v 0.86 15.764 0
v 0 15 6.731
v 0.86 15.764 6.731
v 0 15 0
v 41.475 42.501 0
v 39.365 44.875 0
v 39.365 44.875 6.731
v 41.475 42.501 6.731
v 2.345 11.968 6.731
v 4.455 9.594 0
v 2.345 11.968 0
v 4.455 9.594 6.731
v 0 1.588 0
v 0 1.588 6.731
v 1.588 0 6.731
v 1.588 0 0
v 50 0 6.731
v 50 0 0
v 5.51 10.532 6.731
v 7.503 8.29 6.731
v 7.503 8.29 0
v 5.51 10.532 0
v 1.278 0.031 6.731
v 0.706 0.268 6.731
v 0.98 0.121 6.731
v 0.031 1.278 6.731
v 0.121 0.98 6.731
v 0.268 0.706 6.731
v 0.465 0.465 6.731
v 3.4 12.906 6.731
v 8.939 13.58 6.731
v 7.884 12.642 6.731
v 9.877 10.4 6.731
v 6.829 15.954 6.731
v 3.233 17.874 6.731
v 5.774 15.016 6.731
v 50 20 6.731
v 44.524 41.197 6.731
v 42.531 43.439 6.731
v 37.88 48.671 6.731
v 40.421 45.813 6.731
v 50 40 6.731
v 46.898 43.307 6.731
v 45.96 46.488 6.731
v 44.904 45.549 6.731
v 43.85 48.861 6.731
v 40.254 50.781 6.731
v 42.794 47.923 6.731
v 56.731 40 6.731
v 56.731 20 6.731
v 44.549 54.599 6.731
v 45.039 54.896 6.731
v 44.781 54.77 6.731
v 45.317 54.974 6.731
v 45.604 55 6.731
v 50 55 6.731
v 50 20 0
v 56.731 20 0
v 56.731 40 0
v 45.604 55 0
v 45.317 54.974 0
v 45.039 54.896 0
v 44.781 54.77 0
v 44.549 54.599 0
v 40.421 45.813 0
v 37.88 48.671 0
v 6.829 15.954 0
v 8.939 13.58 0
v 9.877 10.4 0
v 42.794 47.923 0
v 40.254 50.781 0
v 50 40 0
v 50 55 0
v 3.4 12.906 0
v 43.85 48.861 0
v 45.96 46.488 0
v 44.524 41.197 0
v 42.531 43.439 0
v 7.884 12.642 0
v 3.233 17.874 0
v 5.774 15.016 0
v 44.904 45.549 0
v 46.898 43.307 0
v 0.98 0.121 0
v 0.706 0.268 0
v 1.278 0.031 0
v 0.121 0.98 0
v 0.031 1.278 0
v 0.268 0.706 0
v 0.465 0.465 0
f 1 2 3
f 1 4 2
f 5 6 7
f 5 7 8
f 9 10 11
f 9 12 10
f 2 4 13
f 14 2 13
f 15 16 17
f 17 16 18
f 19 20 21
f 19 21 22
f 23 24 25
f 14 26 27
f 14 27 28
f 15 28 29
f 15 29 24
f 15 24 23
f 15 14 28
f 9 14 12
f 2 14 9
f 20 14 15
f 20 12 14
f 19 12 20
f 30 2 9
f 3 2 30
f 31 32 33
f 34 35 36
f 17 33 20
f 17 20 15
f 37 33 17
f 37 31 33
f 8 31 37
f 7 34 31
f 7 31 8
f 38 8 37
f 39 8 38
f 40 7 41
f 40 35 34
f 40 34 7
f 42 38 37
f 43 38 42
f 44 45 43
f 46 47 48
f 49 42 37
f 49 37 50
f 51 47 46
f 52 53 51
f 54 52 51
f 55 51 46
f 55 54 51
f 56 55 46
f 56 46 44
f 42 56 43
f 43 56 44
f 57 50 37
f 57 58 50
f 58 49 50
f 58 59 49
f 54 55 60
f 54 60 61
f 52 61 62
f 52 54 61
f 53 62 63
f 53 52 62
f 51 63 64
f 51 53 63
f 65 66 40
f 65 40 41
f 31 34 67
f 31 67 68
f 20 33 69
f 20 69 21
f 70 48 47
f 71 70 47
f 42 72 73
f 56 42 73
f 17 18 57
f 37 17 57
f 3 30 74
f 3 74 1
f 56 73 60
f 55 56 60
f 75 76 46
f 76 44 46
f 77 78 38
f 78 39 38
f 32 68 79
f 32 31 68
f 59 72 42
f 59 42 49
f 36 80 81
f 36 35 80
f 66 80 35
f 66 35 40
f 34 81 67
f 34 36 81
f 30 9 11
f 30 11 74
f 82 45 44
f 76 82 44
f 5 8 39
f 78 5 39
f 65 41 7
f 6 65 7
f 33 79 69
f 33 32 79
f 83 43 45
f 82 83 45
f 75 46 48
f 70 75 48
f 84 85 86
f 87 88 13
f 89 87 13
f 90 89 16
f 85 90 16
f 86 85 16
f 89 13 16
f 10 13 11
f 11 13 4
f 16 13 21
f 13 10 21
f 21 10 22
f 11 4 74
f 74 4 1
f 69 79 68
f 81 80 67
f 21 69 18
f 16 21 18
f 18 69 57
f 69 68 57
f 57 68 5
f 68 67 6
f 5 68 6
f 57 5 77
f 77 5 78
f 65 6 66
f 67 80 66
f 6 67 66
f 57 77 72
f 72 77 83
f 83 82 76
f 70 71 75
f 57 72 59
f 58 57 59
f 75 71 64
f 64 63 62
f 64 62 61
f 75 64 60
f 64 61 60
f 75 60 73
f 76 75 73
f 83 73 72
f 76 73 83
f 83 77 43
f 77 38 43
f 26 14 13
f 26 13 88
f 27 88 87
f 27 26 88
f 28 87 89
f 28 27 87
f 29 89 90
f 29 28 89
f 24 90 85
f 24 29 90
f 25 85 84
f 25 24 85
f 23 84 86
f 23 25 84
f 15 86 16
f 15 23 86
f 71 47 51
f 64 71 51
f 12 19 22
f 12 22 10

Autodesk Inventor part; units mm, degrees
ref_plane "YZ Plane" through (0, 0, 0) normal (1, 0, 0) x (0, 1, 0)
ref_plane "XZ Plane" through (0, 0, 0) normal (0, 1, 0) x (-1, 0, 0)
ref_plane "XY Plane" through (0, 0, 0) normal (0, 0, 1) x (1, 0, 0)
sketch "Sketch1" plane through (0, 0, 0) normal (0, 0, 1) x (1, 0, 0)
  line L0 (0, 0) -> (50, 0)
  line L1 (50, 0) -> (50, 40)
  line L2 (50, 40) -> (56.731, 40)
  line L3 (56.731, 40) -> (56.731, 20)
  line L4 (56.731, 20) -> (50, 20)
  line L5 (50, 20) -> (50, 40)
  line L6 (10, 3.269) -> (30, 3.269)
  line L7 (30, 3.269) -> (30, 10)
  line L8 (30, 10) -> (10, 10)
  line L9 (10, 10) -> (10, 3.269)
  line L10 (0, 10) -> (10, 10)
  line L11 (30, 10) -> (50, 10)
  line L12 (0, 10) -> (0, 0)
  line L13 (0, 10) -> (0, 15)
  line L14 (0, 15) -> (45, 55)
  line L15 (50, 40) -> (50, 55)
  line L16 (50, 55) -> (45, 55)
  point P0 (20, 3.269)
  point P1 (20, 0)
  dimension "d2" = 20
  dimension "d3" = 20
  dimension "d5" = 6.731
  dimension "d6" = 10
  dimension "d9" = 10
  dimension "d11" = 20
  dimension "d12" = 20
  dimension "d14" = 5
  dimension "d16" = 15
  dimension "d17" = 5
extrude "Extrusion1" add sketch "Sketch1" along normal blind 6.731
fillet "Fillet1" radius 1.5875 2 edges at (45, 55, 3.3655) (0, 0, 3.3655)
sketch "Sketch3" plane through (0, 0, 6.731) normal (0, 0, 1) x (1, 0, 0)
  line L0 (45, 55) -> (0, 15) projected
  line L1 (3.2333, 17.874) -> (5.7738, 15.0159)
  line L2 (5.7738, 15.0159) -> (6.8292, 15.954)
  line L3 (6.8292, 15.954) -> (8.9392, 13.5803)
  line L4 (8.9392, 13.5803) -> (7.8838, 12.6422)
  line L5 (7.8838, 12.6422) -> (9.8769, 10.3999)
  line L6 (9.8769, 10.3999) -> (7.5032, 8.2899)
  line L7 (7.5032, 8.2899) -> (5.5101, 10.5322)
  line L8 (5.5101, 10.5322) -> (4.4547, 9.5941)
  line L9 (4.4547, 9.5941) -> (2.3447, 11.9678)
  line L10 (2.3447, 11.9678) -> (3.4, 12.9059)
  line L11 (3.4, 12.9059) -> (0.8595, 15.764)
  line L12 (37.8802, 48.6713) -> (40.4207, 45.8132)
  line L13 (40.4207, 45.8132) -> (39.3654, 44.8751)
  line L14 (39.3654, 44.8751) -> (41.4754, 42.5013)
  line L15 (41.4754, 42.5013) -> (42.5307, 43.4394)
  line L16 (42.5307, 43.4394) -> (44.5238, 41.1972)
  line L17 (44.5238, 41.1972) -> (46.8976, 43.3072)
  line L18 (46.8976, 43.3072) -> (44.9045, 45.5494)
  line L19 (44.9045, 45.5494) -> (45.9598, 46.4875)
  line L20 (45.9598, 46.4875) -> (43.8498, 48.8613)
  line L21 (43.8498, 48.8613) -> (42.7945, 47.9232)
  line L22 (42.7945, 47.9232) -> (40.254, 50.7813)
  dimension "d24" = 3.176
  dimension "d25" = 10
  dimension "d26" = 3
  dimension "d27" = 6
  dimension "d28" = 1.15
  dimension "d29" = 6.35
extrude "Extrusion3" cut sketch "Sketch3" against normal up to next
equation "\"d5\" = THICKB"
equation "\"d7\" = THICKB"
equation "\"THICKA\" = 3.175"
equation "\"THICKB\" = 6.731"
equation "\"THICKC\" = 12.7"
equation "\"THICKPLY\" = 5"
equation "\"MAGDIA\" = 9.5"
equation "\"BALLDIA\" = 12"
properties part number "Mount_LCD_End"
